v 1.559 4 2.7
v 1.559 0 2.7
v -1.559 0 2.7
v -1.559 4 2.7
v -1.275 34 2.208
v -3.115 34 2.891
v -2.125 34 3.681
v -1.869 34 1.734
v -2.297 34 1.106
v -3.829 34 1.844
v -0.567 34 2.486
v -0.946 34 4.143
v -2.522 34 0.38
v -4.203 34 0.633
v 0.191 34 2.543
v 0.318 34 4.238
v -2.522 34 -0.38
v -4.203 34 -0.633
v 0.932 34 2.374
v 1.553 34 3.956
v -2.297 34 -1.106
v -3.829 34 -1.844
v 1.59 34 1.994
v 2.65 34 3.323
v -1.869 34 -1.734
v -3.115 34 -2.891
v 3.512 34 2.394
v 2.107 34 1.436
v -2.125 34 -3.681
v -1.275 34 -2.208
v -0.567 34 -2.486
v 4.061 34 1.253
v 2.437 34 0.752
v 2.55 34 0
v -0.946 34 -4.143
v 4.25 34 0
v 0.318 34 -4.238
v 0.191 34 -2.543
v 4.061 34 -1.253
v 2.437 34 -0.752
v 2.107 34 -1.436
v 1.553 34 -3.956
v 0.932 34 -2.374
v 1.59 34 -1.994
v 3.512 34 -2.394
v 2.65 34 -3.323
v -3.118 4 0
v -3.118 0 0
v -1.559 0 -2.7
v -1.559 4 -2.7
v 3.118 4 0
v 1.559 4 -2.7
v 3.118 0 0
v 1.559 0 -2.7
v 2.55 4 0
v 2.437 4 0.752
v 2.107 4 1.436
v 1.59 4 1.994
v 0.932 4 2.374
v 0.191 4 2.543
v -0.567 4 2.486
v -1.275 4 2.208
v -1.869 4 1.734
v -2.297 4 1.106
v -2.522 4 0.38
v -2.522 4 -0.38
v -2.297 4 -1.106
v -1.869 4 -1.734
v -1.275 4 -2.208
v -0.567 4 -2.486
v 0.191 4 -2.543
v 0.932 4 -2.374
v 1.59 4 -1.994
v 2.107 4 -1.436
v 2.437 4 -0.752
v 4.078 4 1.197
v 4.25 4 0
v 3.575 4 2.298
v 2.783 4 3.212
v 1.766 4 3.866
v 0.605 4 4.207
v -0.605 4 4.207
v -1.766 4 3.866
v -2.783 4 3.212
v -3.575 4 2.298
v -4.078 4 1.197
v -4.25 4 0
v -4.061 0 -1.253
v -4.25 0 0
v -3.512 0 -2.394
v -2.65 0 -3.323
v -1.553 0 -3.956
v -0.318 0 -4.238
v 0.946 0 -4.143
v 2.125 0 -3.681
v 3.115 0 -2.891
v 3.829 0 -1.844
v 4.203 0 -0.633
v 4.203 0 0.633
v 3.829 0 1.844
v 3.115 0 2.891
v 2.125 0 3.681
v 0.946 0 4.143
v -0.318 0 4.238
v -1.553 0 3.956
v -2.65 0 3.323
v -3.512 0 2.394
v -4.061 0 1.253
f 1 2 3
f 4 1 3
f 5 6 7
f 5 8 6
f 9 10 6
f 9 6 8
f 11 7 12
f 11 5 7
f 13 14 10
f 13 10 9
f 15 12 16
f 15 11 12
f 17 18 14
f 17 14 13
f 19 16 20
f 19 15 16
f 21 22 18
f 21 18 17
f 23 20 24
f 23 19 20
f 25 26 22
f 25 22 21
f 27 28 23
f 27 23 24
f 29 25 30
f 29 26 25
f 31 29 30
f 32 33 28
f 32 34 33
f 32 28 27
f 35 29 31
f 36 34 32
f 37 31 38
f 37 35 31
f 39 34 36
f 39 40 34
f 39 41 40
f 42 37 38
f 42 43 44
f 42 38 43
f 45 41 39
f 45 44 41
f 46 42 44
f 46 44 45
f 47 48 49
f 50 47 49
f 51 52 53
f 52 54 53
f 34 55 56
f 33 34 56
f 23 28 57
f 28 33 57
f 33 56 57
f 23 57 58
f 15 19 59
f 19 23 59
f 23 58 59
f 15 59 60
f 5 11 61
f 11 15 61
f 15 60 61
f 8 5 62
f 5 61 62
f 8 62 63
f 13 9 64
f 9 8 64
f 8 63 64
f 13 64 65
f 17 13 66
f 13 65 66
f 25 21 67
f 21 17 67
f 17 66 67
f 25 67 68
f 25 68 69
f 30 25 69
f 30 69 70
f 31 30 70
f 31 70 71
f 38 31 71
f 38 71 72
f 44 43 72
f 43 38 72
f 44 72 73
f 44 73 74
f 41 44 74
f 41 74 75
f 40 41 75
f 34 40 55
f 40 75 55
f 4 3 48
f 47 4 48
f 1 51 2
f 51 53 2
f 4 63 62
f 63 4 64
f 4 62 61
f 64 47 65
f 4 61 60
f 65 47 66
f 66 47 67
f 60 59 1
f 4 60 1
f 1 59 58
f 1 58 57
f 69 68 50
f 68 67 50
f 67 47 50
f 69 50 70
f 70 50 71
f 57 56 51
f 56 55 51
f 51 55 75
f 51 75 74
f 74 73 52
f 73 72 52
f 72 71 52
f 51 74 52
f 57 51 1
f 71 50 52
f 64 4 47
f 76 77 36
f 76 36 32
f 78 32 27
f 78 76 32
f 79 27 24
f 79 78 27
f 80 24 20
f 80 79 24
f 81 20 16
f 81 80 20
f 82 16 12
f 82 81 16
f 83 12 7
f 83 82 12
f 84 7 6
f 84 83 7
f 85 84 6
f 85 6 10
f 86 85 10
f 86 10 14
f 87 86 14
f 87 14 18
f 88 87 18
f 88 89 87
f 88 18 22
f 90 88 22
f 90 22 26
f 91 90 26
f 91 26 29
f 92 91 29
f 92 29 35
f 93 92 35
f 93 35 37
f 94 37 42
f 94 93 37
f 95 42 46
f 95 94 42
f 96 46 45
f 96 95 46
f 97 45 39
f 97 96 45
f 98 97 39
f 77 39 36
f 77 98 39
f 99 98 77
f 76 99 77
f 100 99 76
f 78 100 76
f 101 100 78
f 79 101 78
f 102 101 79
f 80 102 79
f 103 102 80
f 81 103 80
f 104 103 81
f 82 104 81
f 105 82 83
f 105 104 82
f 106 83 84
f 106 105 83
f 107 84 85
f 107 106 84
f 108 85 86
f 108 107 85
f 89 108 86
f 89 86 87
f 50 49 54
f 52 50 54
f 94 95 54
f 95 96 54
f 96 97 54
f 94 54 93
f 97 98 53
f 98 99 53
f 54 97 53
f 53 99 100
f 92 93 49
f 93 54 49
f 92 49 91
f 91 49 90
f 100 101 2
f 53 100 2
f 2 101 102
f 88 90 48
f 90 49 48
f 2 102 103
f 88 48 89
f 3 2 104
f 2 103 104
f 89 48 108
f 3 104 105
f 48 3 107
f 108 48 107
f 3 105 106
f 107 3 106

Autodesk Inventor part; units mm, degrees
ref_plane "YZ Plane" through (0, 0, 0) normal (1, 0, 0) x (0, 1, 0)
ref_plane "XZ Plane" through (0, 0, 0) normal (0, 1, 0) x (-1, 0, 0)
ref_plane "XY Plane" through (0, 0, 0) normal (0, 0, 1) x (1, 0, 0)
sketch "Sketch8" plane through (0, 0, 0) normal (0, 1, 0) x (-1, 0, 0)
  circle A0 centre (0, 0) radius 4.25
  line L0 (-1.5588, -2.7) -> (-3.1177, 0)
  line L1 (-3.1177, 0) -> (-1.5588, 2.7)
  line L2 (-1.5588, 2.7) -> (1.5588, 2.7)
  line L3 (1.5588, 2.7) -> (3.1177, 0)
  line L4 (3.1177, 0) -> (1.5588, -2.7)
  line L5 (1.5588, -2.7) -> (-1.5588, -2.7)
  line L6 (-5.95, 0) -> (5.95, 0) projected
  dimension "d57" = 8.5
  dimension "d58" = 5.4
extrude "Extrusion7" add sketch "Sketch8" along normal blind 4 contours L6 L3 L2 L1 A0 | A0 L6 L0 L5 L4
sketch "Sketch9" plane through (0, 4, 0) normal (0, 1, 0) x (1, 0, 0)
  circle A0 centre (0, 0) radius 4.25 projected
  line L0 (-3.1177, 0) -> (-1.5588, 2.7) projected
  line L1 (-1.5588, 2.7) -> (1.5588, 2.7) projected
  line L2 (1.5588, 2.7) -> (3.1177, 0) projected
  line L3 (3.1177, 0) -> (1.5588, -2.7) projected
  line L4 (1.5588, -2.7) -> (-1.5588, -2.7) projected
  line L5 (-1.5588, -2.7) -> (-3.1177, 0) projected
  circle A1 centre (0, 0) radius 2.55
  dimension "d61" = 5.1
extrude "Extrusion8" add sketch "Sketch9" along normal blind 30 contours A0 | L0 L1 L2 L3 L4 L5
properties part number "30_Cube_Z_Focus_MGN_NEMA_Motorcoupling_Captive_v3"
